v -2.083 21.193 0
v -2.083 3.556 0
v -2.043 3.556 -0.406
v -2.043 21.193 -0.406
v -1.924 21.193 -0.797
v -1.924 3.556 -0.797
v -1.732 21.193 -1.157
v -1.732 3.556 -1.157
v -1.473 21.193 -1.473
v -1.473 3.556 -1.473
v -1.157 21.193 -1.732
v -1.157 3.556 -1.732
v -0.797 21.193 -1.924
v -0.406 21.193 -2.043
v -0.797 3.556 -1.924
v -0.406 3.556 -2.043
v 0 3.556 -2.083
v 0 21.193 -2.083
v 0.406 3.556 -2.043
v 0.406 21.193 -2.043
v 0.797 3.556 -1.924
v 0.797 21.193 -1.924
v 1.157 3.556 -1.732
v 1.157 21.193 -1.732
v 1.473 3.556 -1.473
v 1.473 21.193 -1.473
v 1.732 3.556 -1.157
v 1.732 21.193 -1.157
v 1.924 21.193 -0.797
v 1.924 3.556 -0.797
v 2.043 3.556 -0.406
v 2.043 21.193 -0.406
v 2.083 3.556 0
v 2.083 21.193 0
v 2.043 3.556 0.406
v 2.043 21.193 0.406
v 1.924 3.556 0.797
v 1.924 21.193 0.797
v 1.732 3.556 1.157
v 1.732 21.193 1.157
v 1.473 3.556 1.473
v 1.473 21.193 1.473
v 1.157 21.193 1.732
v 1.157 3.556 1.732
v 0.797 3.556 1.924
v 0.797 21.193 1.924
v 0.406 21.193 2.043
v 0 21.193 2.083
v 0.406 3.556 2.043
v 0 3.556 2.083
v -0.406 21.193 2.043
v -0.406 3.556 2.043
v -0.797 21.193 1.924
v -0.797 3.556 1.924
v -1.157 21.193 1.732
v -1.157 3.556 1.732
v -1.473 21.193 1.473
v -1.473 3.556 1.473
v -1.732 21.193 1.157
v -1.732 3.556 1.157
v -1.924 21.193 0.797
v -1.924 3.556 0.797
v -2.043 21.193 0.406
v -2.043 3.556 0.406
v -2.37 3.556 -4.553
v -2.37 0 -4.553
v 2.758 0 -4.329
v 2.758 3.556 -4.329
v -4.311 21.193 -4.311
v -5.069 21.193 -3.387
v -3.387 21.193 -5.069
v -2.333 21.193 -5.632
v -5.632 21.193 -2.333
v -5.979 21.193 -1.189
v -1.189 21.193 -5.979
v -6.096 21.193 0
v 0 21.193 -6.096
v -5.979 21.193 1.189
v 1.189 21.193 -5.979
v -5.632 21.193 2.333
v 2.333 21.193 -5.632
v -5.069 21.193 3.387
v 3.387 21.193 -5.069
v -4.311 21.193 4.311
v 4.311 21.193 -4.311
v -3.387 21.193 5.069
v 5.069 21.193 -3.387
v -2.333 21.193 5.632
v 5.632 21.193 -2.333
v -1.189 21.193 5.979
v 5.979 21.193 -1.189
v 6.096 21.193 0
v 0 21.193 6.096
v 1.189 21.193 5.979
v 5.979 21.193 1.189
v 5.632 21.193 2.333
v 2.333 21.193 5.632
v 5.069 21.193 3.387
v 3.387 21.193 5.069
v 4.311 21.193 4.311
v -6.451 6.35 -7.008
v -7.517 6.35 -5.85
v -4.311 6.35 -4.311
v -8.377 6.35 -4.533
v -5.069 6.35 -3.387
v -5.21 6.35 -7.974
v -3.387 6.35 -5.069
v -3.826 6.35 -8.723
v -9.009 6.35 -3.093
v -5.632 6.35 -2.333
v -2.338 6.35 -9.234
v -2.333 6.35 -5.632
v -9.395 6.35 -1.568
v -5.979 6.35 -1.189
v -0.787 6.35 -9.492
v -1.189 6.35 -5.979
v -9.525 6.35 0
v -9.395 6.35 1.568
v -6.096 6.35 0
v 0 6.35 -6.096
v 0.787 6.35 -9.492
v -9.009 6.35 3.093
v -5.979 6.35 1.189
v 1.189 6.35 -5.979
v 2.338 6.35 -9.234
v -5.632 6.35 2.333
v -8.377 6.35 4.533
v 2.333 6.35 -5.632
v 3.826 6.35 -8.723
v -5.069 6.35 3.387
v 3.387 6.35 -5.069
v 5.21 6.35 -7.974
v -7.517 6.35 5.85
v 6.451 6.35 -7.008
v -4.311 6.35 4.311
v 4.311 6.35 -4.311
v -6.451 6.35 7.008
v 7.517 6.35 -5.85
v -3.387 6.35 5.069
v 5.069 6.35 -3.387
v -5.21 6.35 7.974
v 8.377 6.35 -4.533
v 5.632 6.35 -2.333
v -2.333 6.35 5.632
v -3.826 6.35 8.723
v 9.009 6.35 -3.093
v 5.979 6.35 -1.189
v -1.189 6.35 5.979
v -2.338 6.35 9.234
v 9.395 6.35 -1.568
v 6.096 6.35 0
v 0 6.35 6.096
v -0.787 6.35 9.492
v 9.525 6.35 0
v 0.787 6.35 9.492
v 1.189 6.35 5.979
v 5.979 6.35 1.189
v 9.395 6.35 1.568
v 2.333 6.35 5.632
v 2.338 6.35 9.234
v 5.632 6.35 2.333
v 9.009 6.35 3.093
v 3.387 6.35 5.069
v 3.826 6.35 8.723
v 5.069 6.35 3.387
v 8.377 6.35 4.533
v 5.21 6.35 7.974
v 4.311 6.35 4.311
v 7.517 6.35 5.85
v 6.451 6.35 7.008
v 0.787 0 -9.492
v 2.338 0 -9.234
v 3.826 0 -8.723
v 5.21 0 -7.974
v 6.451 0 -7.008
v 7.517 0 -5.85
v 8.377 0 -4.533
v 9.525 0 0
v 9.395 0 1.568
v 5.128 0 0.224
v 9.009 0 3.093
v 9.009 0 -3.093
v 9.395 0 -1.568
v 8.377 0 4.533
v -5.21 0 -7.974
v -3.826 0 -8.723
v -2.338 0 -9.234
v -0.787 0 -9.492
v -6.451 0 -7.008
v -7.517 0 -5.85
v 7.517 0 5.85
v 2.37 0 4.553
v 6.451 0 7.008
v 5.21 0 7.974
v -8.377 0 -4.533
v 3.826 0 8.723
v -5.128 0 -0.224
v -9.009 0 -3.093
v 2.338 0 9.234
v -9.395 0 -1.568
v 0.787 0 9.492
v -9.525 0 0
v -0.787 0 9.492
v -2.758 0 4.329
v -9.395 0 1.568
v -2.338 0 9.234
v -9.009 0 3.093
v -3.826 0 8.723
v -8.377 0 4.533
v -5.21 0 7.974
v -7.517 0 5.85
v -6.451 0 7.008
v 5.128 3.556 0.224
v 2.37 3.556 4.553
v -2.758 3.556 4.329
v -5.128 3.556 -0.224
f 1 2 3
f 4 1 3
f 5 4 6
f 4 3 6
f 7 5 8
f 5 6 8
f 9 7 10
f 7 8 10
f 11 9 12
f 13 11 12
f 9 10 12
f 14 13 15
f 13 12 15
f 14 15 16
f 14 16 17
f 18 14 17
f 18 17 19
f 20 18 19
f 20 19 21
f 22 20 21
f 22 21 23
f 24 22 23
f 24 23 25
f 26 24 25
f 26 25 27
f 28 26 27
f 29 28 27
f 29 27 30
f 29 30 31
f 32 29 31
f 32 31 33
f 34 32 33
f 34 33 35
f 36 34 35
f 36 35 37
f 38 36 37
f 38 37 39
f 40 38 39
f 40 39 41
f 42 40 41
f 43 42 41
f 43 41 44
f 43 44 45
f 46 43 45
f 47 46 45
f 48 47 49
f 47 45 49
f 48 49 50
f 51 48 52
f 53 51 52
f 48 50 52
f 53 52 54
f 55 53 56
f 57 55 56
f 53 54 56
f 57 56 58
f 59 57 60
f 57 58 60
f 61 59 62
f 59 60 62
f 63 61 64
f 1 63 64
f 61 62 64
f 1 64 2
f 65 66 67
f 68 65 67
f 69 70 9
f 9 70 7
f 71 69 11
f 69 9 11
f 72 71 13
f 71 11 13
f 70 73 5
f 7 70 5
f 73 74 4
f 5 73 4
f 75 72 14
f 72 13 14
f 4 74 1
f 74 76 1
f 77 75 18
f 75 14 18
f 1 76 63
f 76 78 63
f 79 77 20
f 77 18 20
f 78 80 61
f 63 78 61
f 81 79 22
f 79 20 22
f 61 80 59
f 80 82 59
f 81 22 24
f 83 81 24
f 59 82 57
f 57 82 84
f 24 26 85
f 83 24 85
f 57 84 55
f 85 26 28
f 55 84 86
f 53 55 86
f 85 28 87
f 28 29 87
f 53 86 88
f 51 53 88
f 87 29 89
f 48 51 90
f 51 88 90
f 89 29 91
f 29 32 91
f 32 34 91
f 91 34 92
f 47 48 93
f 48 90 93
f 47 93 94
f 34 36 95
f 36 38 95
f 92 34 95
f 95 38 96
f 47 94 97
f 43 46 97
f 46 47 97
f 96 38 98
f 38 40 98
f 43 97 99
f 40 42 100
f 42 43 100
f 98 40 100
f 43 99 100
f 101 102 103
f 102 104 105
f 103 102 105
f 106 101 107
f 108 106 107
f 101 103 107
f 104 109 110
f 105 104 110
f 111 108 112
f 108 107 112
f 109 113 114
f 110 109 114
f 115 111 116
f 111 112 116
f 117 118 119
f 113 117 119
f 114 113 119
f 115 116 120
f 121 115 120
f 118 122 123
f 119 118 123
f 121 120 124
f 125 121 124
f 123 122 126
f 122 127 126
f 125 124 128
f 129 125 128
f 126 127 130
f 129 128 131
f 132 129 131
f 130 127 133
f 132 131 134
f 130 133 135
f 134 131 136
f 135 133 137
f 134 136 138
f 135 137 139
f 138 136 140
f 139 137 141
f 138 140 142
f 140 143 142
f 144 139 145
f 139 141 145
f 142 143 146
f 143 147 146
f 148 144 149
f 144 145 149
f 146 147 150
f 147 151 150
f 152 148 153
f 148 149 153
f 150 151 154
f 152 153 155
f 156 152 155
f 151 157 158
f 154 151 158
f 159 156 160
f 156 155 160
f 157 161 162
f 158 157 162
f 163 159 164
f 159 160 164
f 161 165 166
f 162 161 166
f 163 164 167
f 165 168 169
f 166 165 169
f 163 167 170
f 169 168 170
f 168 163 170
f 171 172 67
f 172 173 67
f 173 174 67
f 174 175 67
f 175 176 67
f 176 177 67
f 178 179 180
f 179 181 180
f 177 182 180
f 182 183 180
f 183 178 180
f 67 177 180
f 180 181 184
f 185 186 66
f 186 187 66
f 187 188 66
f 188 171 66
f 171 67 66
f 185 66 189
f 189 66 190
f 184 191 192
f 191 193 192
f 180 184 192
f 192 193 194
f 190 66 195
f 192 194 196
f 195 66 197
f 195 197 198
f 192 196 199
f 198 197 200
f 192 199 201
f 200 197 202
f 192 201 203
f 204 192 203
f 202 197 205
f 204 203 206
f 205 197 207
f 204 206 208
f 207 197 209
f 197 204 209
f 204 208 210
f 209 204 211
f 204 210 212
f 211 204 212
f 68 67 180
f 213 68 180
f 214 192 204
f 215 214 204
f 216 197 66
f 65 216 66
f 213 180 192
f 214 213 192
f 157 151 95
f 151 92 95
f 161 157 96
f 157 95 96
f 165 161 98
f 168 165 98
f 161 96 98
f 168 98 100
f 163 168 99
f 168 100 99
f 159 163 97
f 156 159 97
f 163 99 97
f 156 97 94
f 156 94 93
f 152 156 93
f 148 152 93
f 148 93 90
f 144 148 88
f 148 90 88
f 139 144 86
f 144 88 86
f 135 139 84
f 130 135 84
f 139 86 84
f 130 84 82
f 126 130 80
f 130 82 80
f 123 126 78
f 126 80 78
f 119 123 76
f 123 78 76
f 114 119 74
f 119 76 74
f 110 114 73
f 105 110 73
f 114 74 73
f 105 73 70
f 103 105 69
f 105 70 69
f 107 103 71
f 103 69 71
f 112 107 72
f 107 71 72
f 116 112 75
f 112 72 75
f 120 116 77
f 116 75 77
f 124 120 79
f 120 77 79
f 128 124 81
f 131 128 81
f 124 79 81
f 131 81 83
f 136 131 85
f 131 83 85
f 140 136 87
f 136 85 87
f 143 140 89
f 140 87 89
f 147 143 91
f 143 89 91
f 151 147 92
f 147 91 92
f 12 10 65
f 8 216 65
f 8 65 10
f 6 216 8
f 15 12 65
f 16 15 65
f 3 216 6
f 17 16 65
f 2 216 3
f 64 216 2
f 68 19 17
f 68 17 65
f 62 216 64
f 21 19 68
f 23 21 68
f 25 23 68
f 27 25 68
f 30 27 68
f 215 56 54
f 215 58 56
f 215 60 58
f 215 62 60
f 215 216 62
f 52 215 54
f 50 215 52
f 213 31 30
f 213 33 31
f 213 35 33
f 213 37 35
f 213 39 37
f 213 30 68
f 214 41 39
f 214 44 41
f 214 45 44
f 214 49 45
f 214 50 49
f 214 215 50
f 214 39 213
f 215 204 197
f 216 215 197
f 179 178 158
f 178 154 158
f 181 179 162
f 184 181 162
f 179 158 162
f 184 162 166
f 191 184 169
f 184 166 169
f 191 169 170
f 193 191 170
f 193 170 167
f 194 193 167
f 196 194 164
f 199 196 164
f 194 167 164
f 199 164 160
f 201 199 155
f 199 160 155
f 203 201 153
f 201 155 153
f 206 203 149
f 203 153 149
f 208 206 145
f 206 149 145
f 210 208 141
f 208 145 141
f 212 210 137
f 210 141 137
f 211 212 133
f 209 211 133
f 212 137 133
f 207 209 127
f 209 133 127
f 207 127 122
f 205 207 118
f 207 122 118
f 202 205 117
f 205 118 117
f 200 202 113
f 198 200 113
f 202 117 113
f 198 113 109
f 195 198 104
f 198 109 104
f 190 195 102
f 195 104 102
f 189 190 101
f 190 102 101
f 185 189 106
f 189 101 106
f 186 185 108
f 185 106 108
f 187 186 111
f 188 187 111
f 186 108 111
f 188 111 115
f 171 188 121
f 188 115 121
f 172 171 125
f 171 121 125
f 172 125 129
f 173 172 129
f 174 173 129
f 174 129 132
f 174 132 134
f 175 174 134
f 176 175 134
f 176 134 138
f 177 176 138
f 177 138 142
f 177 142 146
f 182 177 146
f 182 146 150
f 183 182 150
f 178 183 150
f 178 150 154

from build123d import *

# Parameters (mm, degrees)
F_8_32_TAPPED_HOLE1_D = 4.1656
CUT_EXTRUDE1_DEPTH    = 3.556


with BuildPart() as part:
    # Sketch3 → Revolve1 (revolve)
    with BuildSketch(Plane.XY):
        Polygon((0, 0), (9.525, 0), (9.525, 6.35), (6.096, 6.35), (6.096, 21.193), (0, 21.193), align=None)
    revolve(axis=Axis((0, 21.193, 0), (0, -1, 0)))

    # #8-32 Tapped Hole1 (through all)
    with Locations(Plane(origin=(0, 21.193, 0), x_dir=(1, 0, 0), z_dir=(0, 1, 0))):
        with Locations((0, 0)):
            Hole(F_8_32_TAPPED_HOLE1_D / 2)

    # Sketch6 → Cut-Extrude1 (cut)
    with BuildSketch(Plane.XZ):
        Polygon((2.369915953, 4.552749906), (-2.757839099, 4.328782373), (-5.127755052, -0.223967533), (-2.369915953, -4.552749906), (2.757839099, -4.328782373), (5.127755052, 0.223967533), align=None)
    extrude(amount=-CUT_EXTRUDE1_DEPTH, mode=Mode.SUBTRACT)


solid = part.part
